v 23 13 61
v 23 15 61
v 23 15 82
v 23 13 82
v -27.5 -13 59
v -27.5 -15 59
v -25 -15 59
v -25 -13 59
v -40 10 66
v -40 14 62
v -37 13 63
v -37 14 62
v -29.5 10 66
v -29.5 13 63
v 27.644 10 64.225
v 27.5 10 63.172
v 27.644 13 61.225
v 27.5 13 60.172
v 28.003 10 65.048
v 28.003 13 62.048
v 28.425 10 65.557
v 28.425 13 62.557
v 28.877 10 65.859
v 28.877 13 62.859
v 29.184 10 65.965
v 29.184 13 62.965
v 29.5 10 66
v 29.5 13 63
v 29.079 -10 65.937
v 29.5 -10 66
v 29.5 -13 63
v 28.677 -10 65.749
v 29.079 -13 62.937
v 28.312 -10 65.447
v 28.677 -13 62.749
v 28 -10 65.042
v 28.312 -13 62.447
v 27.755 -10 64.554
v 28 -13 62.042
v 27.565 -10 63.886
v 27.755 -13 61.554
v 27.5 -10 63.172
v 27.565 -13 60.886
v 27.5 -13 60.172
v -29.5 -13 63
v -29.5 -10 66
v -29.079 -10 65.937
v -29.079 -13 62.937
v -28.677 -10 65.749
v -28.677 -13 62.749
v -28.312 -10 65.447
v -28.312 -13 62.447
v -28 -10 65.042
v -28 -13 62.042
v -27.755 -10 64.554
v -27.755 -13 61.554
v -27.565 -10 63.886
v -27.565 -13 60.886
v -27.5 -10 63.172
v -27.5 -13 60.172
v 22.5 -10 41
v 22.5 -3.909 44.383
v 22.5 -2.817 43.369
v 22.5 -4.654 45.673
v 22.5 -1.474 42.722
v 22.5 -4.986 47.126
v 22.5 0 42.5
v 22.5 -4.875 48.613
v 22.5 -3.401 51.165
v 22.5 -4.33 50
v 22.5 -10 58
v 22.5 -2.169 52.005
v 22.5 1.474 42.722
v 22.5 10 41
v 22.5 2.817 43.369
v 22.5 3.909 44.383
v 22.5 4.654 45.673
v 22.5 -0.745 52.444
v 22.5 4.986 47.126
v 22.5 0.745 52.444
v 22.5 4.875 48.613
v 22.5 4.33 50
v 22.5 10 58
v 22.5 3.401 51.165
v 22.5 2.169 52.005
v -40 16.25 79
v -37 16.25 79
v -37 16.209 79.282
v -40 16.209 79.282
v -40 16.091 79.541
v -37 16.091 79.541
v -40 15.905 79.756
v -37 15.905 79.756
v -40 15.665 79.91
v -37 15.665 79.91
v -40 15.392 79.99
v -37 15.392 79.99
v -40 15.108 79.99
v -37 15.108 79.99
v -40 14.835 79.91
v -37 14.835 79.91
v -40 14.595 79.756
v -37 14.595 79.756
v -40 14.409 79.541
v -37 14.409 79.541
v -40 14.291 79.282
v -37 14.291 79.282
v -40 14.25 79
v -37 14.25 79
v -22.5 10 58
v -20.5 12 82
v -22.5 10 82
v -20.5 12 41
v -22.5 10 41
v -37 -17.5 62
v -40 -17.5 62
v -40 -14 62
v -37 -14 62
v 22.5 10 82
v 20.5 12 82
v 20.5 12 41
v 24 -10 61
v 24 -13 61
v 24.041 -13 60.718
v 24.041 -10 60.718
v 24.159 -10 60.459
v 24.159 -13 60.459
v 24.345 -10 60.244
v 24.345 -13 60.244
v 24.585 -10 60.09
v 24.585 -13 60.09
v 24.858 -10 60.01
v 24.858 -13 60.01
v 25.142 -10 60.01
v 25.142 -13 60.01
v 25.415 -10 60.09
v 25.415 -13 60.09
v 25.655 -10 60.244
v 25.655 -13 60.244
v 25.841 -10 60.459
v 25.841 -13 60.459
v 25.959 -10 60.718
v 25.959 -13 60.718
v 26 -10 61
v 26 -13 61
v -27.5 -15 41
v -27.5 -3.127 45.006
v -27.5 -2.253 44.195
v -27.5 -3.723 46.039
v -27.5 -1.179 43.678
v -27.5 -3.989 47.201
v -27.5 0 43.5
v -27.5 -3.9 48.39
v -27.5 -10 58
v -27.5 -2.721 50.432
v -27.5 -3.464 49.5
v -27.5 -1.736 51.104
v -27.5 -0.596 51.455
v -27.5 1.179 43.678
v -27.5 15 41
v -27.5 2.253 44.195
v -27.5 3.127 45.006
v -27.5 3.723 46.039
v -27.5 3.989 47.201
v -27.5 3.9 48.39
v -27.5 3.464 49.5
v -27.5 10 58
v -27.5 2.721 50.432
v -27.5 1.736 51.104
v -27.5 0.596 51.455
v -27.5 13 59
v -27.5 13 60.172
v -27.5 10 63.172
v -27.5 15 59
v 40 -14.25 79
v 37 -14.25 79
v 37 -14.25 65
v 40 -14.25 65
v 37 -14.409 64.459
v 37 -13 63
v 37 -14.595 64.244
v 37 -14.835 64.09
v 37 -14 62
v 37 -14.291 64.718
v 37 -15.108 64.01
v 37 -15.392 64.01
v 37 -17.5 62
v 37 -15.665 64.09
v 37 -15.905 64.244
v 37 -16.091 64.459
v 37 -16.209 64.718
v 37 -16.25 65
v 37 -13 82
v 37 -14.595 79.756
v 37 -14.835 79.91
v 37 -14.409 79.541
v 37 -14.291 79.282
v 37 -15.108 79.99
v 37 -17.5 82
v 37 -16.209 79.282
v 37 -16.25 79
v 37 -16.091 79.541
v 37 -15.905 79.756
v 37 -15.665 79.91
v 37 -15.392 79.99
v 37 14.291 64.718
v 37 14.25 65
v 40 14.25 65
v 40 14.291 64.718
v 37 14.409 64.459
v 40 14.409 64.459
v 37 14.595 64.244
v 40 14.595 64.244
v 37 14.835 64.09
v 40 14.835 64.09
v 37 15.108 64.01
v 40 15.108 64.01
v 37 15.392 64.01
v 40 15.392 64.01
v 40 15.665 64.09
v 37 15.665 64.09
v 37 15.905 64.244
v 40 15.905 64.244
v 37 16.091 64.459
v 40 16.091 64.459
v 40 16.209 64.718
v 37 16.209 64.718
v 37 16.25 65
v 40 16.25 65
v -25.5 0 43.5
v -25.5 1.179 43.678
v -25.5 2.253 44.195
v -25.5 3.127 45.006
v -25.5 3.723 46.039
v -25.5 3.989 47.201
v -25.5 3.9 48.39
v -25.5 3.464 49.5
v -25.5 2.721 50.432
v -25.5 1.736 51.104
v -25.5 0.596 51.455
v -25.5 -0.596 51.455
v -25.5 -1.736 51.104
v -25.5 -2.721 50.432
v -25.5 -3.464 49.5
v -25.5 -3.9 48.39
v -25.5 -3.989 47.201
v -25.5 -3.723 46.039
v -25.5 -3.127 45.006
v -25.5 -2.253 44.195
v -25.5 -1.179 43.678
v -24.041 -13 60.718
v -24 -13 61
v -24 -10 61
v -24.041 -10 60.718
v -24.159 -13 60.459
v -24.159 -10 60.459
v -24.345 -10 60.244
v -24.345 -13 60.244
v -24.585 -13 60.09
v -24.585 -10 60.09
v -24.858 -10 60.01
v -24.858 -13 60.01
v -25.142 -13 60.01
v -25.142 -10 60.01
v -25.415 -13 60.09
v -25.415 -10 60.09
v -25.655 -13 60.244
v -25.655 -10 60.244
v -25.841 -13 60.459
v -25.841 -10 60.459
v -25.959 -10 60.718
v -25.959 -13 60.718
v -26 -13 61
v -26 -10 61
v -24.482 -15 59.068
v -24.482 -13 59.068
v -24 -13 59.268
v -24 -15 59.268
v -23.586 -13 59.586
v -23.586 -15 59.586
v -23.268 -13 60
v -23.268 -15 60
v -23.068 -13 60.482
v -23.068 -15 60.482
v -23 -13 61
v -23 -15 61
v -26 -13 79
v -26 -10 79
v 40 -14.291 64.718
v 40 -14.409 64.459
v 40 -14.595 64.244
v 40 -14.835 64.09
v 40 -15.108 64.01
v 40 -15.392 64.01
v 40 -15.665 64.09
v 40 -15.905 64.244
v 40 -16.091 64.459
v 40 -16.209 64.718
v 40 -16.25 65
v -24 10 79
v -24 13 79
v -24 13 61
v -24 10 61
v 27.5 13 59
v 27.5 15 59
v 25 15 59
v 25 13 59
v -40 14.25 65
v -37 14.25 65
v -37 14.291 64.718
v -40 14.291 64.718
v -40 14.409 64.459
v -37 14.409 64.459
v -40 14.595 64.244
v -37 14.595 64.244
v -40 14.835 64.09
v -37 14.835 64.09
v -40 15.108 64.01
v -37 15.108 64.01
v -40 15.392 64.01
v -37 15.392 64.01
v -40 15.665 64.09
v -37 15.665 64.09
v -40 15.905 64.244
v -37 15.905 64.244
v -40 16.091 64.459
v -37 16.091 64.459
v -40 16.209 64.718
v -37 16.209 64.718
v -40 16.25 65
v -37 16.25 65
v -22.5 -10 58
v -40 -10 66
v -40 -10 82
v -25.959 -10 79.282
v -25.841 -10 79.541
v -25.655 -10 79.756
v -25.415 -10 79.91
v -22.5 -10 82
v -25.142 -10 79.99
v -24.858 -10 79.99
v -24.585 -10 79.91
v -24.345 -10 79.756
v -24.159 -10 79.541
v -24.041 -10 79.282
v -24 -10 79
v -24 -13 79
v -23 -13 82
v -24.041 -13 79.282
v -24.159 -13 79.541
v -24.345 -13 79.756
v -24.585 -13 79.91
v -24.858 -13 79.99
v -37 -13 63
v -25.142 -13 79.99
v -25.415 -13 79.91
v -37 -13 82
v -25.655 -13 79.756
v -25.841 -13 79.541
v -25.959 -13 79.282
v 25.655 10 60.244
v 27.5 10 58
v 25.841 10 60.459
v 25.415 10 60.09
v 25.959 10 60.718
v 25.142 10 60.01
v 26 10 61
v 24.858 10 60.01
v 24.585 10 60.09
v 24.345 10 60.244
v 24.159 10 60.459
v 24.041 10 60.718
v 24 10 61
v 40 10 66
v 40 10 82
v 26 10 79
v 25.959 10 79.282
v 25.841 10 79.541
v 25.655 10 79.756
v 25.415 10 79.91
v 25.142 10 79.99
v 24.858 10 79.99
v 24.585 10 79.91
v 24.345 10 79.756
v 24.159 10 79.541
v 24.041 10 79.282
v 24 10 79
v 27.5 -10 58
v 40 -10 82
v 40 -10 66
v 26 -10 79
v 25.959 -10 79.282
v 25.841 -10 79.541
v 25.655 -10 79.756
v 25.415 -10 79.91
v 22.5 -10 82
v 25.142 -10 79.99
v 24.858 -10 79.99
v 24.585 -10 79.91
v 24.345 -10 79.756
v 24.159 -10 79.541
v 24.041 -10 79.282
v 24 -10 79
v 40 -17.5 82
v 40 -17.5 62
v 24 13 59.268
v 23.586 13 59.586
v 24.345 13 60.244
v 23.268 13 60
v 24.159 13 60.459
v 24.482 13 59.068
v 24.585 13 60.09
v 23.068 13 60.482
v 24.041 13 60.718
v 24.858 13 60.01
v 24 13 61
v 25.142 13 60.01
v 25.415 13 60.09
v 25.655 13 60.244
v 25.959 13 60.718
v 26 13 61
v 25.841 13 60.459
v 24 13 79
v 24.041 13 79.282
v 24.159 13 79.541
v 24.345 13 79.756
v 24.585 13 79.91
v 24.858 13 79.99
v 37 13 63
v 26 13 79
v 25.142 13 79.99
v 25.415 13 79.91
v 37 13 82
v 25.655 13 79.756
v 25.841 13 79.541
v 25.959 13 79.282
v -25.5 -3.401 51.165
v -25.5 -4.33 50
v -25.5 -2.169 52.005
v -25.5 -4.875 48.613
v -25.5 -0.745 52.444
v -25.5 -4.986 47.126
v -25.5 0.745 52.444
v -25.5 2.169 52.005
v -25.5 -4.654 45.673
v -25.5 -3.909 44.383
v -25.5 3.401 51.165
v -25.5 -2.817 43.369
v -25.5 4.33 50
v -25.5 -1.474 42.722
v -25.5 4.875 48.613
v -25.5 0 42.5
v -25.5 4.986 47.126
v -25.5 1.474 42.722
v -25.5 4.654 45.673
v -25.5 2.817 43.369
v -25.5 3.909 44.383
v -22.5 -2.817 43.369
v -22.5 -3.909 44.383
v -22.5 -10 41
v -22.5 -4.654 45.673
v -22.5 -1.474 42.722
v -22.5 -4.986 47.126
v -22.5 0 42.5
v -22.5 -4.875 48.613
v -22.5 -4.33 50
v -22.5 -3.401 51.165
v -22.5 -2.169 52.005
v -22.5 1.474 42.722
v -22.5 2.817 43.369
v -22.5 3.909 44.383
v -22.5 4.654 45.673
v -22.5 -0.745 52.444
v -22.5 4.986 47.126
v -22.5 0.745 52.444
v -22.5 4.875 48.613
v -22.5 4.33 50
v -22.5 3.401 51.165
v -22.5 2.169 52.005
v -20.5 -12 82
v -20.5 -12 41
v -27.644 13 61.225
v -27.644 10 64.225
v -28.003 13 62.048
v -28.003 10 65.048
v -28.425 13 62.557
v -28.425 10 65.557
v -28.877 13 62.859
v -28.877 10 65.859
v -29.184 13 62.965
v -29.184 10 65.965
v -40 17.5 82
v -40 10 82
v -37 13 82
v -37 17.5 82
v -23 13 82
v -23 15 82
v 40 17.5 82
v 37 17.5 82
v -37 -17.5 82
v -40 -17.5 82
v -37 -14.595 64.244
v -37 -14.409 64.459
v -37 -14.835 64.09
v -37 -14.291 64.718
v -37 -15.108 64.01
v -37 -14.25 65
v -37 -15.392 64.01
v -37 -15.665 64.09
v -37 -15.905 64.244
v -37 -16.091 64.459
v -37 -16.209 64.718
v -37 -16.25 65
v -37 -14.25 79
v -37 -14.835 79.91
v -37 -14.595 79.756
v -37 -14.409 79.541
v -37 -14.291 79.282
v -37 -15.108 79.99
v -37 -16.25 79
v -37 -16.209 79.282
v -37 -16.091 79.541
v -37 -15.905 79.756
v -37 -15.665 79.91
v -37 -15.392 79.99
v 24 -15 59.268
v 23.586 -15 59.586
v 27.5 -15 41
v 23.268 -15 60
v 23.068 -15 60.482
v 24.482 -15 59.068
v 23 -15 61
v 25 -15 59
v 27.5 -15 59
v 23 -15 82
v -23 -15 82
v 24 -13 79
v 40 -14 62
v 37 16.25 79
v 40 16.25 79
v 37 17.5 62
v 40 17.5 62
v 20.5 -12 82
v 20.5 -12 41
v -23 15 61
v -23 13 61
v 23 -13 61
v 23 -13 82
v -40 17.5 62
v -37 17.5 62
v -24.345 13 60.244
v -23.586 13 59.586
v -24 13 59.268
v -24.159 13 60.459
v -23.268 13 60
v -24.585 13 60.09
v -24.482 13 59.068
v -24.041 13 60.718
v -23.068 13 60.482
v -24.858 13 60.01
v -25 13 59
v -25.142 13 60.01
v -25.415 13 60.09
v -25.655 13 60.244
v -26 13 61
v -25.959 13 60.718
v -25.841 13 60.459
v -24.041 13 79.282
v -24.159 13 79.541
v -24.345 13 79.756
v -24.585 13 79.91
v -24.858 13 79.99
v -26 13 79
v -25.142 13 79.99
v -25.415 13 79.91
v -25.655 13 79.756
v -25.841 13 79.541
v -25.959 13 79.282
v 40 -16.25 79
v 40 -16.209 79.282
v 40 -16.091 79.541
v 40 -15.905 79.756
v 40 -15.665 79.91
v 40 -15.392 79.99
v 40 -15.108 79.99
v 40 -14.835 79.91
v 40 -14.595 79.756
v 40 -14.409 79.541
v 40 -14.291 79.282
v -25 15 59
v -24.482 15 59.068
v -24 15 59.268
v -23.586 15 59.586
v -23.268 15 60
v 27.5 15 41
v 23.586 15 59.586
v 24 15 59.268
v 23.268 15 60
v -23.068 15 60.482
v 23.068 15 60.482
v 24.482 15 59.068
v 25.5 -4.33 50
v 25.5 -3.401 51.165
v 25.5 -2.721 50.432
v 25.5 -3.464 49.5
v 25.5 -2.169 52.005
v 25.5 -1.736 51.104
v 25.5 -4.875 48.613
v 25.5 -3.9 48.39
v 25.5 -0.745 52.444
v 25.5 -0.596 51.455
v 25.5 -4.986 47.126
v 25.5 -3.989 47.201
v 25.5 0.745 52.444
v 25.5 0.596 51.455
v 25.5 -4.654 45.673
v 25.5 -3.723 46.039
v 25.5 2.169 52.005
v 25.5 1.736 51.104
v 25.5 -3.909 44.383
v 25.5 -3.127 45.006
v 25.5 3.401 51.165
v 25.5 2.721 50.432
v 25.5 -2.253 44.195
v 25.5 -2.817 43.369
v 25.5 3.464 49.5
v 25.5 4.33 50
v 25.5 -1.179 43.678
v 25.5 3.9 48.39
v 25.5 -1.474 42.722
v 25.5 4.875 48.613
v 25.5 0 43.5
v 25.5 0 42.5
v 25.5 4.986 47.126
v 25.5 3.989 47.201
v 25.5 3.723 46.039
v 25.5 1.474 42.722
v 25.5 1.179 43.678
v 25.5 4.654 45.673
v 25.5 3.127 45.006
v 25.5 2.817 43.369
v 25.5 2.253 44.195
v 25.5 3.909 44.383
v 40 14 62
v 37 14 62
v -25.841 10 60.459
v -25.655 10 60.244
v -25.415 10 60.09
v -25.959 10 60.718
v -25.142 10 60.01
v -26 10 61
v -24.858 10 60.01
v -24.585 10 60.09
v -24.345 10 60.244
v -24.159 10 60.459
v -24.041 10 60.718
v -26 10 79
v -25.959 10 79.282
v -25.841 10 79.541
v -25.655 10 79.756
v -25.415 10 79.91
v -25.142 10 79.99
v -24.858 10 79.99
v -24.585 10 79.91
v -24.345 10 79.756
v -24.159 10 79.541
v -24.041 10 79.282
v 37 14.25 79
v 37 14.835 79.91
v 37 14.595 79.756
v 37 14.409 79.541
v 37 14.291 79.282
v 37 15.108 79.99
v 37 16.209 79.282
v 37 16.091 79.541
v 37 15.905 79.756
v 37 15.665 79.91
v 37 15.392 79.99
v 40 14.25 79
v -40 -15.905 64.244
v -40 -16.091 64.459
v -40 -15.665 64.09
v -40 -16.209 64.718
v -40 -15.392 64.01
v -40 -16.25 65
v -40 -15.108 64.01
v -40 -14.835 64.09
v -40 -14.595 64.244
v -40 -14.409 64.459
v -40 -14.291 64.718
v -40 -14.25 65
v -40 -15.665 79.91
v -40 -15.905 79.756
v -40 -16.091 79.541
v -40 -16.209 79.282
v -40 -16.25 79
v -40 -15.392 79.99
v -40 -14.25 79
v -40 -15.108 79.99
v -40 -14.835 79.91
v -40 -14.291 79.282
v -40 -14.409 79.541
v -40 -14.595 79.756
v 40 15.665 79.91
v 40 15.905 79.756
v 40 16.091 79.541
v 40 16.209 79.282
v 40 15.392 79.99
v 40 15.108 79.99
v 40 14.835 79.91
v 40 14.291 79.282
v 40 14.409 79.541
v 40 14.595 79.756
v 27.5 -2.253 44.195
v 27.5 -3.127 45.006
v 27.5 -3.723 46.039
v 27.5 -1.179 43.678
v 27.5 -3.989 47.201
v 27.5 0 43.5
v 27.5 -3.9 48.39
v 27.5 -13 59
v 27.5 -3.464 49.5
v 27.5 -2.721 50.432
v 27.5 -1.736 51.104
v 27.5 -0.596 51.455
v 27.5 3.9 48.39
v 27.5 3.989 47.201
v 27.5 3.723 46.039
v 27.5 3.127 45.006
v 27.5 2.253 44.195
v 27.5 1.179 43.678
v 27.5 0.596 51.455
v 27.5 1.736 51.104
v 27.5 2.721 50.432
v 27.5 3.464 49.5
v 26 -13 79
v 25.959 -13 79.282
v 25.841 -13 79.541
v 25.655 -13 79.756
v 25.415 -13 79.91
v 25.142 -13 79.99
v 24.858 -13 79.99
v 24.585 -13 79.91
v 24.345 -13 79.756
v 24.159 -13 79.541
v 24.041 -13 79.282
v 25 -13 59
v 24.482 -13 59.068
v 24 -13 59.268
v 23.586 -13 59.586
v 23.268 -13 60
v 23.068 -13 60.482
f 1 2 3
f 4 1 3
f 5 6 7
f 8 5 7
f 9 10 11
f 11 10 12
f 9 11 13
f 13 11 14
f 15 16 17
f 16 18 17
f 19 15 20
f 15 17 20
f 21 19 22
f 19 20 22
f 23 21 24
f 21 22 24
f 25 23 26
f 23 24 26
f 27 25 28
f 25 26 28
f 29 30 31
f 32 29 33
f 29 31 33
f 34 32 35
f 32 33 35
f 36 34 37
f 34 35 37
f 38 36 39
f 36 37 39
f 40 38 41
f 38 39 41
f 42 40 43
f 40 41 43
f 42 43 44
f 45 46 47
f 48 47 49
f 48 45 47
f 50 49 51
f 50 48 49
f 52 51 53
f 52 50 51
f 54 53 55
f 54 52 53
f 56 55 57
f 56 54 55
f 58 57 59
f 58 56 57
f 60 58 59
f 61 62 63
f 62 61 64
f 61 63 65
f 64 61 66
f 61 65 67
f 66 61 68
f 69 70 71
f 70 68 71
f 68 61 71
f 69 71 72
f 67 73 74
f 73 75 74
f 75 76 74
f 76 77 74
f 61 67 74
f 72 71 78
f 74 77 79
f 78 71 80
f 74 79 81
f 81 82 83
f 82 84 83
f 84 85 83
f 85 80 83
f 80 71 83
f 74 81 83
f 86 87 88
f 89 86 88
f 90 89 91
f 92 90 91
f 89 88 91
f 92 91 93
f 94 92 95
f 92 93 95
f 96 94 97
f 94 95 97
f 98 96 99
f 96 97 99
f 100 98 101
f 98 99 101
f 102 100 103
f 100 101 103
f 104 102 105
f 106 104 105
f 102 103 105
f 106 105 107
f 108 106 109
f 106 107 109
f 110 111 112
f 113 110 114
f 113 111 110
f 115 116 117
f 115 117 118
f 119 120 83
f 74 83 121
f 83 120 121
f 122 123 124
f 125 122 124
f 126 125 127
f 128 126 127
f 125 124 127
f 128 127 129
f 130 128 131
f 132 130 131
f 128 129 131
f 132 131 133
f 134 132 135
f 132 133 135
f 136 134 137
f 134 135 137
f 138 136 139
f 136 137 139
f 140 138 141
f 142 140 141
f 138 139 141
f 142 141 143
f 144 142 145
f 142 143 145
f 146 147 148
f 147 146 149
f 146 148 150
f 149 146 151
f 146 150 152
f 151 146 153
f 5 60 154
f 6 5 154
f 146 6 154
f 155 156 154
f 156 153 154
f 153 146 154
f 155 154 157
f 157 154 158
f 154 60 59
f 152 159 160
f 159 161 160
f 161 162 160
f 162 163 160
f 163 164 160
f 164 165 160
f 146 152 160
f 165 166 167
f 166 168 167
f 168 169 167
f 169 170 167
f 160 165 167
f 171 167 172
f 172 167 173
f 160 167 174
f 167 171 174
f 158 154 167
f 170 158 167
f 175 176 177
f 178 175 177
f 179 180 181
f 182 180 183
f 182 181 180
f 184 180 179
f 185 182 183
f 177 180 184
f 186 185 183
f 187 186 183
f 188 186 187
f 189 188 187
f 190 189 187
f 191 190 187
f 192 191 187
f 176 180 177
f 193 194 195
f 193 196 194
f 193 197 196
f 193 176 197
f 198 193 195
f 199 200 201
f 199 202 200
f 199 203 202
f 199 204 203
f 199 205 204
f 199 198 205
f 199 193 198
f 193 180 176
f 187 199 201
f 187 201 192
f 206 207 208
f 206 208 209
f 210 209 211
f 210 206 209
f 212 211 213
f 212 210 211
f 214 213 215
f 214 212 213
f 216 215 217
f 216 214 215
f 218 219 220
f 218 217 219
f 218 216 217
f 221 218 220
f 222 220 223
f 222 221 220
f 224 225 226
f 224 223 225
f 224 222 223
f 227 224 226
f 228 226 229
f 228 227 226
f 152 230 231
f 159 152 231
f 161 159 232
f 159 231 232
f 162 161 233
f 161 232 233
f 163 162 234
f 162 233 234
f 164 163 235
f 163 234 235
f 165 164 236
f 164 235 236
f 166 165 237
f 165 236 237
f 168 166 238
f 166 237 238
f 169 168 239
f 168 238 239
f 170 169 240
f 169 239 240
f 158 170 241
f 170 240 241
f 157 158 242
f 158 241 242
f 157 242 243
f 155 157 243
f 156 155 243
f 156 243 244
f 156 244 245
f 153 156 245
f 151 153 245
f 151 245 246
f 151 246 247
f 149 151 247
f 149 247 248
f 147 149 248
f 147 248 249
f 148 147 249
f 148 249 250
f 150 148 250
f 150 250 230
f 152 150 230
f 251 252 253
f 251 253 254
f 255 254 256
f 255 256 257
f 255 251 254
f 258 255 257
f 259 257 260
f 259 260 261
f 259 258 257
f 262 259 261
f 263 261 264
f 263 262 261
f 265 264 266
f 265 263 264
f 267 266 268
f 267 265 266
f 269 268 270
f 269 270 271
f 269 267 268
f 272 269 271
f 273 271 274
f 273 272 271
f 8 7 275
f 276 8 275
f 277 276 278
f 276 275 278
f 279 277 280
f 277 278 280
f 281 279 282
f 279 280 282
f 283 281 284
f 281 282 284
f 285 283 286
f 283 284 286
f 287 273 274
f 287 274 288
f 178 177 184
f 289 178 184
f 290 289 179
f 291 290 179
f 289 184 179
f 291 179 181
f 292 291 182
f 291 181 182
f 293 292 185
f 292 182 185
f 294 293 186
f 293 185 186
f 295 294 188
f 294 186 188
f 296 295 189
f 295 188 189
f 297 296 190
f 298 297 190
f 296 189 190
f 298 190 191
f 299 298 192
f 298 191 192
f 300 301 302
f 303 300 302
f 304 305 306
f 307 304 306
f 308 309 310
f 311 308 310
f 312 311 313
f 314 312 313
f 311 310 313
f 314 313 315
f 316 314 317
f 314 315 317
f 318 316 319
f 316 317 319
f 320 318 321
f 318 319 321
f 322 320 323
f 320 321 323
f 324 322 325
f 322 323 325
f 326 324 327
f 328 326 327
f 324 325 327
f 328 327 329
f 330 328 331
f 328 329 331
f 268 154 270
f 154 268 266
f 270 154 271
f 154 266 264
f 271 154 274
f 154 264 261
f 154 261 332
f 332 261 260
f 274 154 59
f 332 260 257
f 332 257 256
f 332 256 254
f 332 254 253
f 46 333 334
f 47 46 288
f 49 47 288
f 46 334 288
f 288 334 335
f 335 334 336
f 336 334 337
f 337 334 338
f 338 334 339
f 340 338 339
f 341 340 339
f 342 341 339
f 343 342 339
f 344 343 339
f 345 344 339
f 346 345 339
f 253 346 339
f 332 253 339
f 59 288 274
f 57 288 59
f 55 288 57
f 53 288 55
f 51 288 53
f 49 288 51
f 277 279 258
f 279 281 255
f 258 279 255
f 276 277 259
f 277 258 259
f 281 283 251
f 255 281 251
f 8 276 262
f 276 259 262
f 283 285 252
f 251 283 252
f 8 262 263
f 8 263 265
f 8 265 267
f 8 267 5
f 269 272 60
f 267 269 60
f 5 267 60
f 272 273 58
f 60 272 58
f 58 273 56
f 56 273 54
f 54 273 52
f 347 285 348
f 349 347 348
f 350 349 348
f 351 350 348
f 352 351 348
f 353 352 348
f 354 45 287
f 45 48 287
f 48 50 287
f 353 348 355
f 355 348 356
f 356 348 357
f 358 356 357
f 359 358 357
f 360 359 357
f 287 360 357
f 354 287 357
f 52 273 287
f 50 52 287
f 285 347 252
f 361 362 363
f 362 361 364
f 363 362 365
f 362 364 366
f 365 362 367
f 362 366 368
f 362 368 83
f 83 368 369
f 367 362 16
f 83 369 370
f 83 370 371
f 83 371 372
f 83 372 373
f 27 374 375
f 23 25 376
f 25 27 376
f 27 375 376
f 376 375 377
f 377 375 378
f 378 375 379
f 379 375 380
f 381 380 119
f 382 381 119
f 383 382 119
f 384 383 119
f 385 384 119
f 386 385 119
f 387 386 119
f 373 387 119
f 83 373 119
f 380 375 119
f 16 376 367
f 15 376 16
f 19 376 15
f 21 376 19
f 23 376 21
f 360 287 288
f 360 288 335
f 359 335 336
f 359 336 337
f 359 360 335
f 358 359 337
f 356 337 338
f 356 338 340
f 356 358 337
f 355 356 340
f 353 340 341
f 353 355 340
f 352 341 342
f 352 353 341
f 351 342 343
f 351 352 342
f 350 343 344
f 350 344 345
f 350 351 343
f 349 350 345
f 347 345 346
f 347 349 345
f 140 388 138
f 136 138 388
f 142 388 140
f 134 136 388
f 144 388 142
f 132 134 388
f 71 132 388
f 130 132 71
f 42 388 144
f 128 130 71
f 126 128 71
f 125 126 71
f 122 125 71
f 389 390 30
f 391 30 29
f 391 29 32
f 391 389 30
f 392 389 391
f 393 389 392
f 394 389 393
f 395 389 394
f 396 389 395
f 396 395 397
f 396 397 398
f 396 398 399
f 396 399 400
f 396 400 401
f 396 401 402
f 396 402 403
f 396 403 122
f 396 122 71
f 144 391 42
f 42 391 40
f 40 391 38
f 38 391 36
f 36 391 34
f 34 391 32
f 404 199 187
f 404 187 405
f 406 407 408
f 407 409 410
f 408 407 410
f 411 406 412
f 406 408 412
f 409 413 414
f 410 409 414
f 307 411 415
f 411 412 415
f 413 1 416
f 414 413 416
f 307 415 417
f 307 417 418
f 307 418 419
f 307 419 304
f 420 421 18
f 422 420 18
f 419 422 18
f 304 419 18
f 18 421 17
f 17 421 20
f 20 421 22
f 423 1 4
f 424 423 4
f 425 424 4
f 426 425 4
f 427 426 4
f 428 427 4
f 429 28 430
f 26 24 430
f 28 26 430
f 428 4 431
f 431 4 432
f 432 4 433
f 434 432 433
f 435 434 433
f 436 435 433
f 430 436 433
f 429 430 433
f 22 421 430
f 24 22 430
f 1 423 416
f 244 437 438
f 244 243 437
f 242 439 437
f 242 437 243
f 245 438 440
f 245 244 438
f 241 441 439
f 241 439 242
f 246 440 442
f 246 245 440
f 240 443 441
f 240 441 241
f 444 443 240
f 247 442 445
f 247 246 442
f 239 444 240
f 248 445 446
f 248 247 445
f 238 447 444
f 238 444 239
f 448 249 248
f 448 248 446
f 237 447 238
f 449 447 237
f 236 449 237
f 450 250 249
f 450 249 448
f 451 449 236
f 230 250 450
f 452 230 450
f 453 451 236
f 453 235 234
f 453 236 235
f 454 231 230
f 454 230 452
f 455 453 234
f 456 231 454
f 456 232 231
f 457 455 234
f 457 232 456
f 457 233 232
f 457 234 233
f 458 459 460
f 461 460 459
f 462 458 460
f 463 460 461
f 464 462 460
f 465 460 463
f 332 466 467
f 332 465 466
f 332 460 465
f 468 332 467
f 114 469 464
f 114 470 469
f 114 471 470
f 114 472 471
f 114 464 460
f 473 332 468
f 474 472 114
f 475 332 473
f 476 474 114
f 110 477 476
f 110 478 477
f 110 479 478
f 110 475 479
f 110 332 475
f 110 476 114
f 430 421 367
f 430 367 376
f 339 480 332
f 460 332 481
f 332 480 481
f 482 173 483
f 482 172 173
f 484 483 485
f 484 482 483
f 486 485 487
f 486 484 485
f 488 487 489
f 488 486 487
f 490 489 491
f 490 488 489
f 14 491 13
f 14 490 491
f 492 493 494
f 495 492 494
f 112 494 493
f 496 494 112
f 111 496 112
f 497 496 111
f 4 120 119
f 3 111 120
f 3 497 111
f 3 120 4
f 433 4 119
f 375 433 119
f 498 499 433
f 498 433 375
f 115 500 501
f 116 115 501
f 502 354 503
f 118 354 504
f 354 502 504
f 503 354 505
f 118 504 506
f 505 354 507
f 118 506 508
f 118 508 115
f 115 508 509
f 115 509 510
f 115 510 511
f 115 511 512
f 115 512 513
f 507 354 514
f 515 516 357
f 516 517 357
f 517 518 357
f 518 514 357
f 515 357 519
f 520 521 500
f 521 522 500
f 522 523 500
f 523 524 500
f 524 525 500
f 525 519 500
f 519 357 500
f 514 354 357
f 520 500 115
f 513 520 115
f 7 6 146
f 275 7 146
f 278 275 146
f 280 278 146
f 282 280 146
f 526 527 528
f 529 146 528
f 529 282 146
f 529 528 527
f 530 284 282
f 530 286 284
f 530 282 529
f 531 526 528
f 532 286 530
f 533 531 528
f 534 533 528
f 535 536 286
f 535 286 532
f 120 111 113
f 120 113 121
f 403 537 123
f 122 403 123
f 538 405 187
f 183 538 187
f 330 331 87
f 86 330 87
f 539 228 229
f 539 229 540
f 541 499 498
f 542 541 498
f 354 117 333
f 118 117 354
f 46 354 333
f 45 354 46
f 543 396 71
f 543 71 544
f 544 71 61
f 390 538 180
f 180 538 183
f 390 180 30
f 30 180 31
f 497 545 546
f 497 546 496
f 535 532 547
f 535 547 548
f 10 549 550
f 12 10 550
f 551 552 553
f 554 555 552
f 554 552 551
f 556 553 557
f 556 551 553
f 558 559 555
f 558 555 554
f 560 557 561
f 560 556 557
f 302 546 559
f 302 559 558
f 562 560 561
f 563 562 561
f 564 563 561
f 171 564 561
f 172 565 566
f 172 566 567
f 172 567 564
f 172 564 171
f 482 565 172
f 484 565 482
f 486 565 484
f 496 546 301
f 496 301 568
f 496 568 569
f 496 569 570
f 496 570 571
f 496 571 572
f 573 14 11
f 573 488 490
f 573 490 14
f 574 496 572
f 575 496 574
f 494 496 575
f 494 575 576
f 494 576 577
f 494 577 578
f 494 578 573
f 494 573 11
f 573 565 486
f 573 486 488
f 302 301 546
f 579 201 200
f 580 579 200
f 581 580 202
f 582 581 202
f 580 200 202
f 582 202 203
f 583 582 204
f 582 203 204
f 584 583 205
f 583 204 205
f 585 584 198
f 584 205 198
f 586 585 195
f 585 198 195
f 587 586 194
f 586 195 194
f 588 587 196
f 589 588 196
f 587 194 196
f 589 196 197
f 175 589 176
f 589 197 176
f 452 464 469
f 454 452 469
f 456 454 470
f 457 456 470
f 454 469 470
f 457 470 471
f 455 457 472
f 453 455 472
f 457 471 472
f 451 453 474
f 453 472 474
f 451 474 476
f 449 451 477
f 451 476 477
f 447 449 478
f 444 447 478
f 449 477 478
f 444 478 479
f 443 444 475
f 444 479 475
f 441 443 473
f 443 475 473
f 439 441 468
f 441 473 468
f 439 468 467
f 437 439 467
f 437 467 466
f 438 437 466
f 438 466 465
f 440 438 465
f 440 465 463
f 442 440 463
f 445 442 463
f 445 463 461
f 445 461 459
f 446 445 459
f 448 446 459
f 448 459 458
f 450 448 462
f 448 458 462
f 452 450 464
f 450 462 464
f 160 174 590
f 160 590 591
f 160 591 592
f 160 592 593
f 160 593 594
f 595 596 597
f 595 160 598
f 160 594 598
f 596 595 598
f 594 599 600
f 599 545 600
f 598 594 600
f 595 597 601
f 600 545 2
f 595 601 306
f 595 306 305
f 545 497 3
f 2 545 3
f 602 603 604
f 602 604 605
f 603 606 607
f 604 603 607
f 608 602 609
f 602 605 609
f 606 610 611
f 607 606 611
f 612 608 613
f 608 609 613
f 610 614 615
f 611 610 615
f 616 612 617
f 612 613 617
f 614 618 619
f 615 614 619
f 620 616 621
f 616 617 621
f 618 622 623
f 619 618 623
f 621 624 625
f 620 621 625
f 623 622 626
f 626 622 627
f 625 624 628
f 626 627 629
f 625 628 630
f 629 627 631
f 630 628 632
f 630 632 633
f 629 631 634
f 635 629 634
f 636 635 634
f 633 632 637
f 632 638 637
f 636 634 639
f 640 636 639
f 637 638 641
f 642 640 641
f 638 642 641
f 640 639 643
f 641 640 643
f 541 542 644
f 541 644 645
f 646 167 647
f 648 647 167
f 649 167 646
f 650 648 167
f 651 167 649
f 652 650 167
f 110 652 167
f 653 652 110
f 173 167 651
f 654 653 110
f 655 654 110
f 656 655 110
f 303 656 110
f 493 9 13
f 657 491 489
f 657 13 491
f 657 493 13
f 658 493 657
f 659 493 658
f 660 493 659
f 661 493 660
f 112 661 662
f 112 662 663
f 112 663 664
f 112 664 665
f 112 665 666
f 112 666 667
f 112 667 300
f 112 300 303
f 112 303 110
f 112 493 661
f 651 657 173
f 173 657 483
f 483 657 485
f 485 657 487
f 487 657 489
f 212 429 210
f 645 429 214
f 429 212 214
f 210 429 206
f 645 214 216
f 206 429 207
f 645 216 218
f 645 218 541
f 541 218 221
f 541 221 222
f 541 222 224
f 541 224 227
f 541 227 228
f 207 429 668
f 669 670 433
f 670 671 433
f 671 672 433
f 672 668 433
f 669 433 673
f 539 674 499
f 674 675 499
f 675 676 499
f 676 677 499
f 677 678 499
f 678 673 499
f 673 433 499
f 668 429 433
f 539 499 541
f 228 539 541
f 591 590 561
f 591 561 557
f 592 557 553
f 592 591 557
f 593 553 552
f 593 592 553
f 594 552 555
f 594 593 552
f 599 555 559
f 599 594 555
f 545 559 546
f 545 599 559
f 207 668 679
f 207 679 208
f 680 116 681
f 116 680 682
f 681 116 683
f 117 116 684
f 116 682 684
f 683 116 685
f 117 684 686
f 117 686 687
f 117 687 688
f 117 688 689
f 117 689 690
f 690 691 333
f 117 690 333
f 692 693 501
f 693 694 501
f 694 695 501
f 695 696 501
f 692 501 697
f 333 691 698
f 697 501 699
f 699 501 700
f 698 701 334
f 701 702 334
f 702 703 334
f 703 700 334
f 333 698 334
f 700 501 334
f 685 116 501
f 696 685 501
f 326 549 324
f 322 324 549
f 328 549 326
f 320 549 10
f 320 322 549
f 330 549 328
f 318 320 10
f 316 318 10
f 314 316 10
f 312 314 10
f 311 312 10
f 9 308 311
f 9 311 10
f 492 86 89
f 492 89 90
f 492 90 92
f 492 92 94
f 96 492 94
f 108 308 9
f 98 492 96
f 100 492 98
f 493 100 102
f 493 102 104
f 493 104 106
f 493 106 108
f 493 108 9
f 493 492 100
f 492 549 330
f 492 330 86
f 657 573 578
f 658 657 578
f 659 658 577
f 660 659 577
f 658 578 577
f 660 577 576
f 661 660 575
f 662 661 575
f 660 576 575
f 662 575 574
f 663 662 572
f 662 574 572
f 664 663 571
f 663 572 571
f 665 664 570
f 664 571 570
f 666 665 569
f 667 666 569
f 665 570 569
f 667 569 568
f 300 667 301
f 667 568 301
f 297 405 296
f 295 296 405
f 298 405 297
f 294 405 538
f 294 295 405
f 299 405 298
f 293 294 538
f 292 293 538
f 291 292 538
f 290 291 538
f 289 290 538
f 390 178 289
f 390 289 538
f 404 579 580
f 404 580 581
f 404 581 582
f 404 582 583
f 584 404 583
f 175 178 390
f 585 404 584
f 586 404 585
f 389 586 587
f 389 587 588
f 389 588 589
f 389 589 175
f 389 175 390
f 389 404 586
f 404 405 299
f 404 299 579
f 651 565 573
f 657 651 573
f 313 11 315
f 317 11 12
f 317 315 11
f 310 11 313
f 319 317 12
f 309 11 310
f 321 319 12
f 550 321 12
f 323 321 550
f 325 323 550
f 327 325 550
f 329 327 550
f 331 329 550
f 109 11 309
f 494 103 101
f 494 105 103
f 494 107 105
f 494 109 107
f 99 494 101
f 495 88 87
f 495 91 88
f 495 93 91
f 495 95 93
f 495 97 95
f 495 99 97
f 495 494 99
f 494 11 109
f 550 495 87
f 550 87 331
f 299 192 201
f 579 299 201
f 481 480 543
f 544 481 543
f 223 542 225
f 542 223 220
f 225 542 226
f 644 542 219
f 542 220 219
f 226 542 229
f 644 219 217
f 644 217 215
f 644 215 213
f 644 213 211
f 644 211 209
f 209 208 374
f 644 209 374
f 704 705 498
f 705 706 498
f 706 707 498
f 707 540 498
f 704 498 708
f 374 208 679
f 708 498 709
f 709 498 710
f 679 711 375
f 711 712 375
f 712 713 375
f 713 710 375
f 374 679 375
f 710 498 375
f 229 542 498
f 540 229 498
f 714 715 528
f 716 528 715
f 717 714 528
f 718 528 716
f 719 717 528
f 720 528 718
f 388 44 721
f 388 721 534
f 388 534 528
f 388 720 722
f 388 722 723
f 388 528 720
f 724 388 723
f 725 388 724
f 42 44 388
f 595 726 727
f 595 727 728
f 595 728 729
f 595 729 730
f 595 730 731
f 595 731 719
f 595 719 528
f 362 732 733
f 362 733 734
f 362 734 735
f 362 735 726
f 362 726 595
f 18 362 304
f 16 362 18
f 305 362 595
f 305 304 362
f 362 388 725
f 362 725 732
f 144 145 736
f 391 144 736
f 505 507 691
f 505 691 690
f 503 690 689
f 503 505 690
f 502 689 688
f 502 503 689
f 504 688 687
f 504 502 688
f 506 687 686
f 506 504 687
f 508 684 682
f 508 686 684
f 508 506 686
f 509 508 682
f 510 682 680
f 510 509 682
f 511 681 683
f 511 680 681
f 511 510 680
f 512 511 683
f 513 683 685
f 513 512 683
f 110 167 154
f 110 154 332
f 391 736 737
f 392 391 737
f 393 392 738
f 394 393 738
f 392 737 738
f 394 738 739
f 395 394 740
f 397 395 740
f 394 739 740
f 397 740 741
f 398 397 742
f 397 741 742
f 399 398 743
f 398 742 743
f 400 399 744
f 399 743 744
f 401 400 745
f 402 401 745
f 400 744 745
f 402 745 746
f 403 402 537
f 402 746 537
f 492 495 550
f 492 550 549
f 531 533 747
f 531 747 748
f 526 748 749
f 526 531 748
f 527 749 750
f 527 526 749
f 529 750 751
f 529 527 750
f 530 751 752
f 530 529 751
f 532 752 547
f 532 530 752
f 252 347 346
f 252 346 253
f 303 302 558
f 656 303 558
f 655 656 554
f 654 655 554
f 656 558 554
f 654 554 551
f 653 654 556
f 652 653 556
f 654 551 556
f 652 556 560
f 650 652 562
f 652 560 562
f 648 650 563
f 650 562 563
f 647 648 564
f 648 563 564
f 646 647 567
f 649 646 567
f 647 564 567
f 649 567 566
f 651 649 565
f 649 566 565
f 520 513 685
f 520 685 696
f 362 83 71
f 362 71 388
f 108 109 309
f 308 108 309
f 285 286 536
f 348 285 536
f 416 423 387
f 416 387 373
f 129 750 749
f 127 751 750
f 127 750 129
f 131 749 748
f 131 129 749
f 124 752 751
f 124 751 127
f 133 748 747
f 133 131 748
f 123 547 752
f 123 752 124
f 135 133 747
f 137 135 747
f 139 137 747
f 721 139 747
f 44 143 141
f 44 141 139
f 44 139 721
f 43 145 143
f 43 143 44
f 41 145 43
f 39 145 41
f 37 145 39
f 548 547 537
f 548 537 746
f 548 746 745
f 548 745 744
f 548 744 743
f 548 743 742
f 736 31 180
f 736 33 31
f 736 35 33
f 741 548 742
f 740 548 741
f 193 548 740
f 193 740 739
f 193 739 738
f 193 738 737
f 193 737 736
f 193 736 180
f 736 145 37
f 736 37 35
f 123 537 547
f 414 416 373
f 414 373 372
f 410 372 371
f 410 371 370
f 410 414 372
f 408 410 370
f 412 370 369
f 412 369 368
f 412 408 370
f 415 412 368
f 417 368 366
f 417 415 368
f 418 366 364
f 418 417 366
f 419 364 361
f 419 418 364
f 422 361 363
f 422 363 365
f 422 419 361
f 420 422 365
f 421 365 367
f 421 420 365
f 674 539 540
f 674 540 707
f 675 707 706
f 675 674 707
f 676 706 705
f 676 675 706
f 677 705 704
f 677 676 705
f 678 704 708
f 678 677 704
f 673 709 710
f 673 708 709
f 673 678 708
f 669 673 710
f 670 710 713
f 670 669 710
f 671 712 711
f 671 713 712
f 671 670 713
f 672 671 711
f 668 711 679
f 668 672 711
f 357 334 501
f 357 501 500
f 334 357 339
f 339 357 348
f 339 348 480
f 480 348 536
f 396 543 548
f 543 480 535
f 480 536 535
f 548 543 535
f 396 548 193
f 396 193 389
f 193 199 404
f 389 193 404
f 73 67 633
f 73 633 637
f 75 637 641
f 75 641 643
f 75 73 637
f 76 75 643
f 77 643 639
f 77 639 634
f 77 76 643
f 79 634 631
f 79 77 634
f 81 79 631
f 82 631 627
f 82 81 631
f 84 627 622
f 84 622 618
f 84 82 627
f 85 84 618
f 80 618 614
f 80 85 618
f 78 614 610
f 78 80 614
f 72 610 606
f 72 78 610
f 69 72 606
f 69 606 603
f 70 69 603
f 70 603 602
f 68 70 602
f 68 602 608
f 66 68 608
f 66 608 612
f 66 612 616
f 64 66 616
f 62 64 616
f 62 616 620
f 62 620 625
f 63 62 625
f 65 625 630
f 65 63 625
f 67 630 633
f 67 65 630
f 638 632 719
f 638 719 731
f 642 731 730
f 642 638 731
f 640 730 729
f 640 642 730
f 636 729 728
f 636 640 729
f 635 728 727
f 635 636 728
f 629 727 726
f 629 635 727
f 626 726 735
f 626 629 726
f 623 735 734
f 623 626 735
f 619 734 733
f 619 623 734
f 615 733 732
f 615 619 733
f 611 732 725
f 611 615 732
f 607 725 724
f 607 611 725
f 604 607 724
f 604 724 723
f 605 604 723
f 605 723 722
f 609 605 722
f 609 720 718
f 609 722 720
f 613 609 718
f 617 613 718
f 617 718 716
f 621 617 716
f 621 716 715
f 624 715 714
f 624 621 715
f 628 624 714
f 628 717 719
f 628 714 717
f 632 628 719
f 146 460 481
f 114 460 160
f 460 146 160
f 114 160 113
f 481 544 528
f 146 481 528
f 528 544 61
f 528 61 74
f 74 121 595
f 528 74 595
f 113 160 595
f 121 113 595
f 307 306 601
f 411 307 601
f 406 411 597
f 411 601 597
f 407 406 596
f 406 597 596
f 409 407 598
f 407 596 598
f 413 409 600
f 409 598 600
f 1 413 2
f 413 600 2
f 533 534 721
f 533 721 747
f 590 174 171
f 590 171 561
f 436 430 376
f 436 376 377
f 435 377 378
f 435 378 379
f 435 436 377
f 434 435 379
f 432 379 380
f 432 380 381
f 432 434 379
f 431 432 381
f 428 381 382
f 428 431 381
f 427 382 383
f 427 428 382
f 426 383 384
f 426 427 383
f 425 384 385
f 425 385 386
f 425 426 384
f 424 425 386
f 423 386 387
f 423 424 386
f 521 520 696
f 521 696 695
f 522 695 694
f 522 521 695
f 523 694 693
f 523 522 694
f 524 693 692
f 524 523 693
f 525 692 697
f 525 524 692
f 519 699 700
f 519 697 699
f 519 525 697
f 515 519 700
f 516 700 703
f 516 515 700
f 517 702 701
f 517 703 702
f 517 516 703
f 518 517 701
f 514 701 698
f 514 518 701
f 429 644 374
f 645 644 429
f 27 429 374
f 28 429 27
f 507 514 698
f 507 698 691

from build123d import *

# Parameters (mm, degrees)
SKIZZE2_W                       = 55
SKIZZE2_H                       = 30
SKIZZE2_W_2                     = 45
SKIZZE2_H_2                     = 24
AUFSATZ_LINEAR_AUSTRAGEN1_DEPTH = 41
SKIZZE5_W                       = 55
SKIZZE5_H                       = 20
SCHNITT_LINEAR_AUSTRAGEN3_DEPTH = 24
SKIZZE4_R                       = 4
SCHNITT_LINEAR_AUSTRAGEN1_DEPTH = 51
SKIZZE4_3_R                     = 5
SCHNITT_LINEAR_AUSTRAGEN2_DEPTH = 3
SCHNITT_LINEAR_AUSTRAGEN4_DEPTH = 5
SCHNITT_LINEAR_AUSTRAGEN5_DEPTH = 2
AUFSATZ_LINEAR_AUSTRAGEN2_DEPTH = 20
SCHNITT_LINEAR_AUSTRAGEN6_DEPTH = 4
SPIEGELN1_COPY_1_DEPTH          = 5
SPIEGELN1_COPY_2_DEPTH          = 2
SPIEGELN1_COPY_3_DEPTH          = 20
SPIEGELN1_COPY_4_DEPTH          = 4
FASE2_SIZE                      = 2
FASE3_SIZE                      = 4
VERRUNDUNG1_R                   = 2


with BuildPart() as part:
    # Skizze2 → Aufsatz-Linear austragen1 (new body)
    with BuildSketch(Plane.XY.offset(82)):
        Rectangle(SKIZZE2_W, SKIZZE2_H)
        Rectangle(SKIZZE2_W_2, SKIZZE2_H_2, mode=Mode.SUBTRACT)
    extrude(amount=-AUFSATZ_LINEAR_AUSTRAGEN1_DEPTH)

    # Skizze5 → Schnitt-Linear austragen3 (cut)
    with BuildSketch(Plane.XY.offset(82)):
        Rectangle(SKIZZE5_W, SKIZZE5_H)
    extrude(amount=-SCHNITT_LINEAR_AUSTRAGEN3_DEPTH, mode=Mode.SUBTRACT)

    # Skizze4 → Schnitt-Linear austragen1 (cut, through all)
    with BuildSketch(Plane(origin=(22.5, 0, 0), x_dir=(0, 0, -1), z_dir=(1, 0, 0))):
        with Locations((-47.5, 0)):
            Circle(SKIZZE4_R)
    schnitt_linear_austragen1 = extrude(amount=-SCHNITT_LINEAR_AUSTRAGEN1_DEPTH, mode=Mode.SUBTRACT)

    # Skizze4<3> → Schnitt-Linear austragen2 (cut)
    with BuildSketch(Plane(origin=(22.5, 0, 0), x_dir=(0, 0, -1), z_dir=(1, 0, 0))):
        with Locations((-47.5, 0)):
            Circle(SKIZZE4_3_R)
    schnitt_linear_austragen2 = extrude(amount=SCHNITT_LINEAR_AUSTRAGEN2_DEPTH, mode=Mode.SUBTRACT)

    # Skizze6 → Schnitt-Linear austragen4 (cut)
    with BuildSketch(Plane(origin=(0, 15, 0), x_dir=(1, 0, 0), z_dir=(0, 1, 0))):
        with BuildLine():
            Line((26, -61), (26, -79))
            ThreePointArc((26, -79), (25, -80), (24, -79))
            Line((24, -79), (24, -61))
            ThreePointArc((24, -61), (25, -60), (26, -61))
        make_face()
    schnitt_linear_austragen4 = extrude(amount=-SCHNITT_LINEAR_AUSTRAGEN4_DEPTH, mode=Mode.SUBTRACT)

    # Skizze6<3> → Schnitt-Linear austragen5 (cut)
    with BuildSketch(Plane(origin=(0, 15, 0), x_dir=(1, 0, 0), z_dir=(0, 1, 0))):
        with BuildLine():
            Line((23, -61), (23, -79))
            ThreePointArc((23, -79), (25, -81), (27, -79))
            Line((27, -79), (27, -61))
            ThreePointArc((27, -61), (25, -59), (23, -61))
        make_face()
        with BuildLine():
            ThreePointArc((24, -79), (25, -80), (26, -79))
            Line((26, -79), (26, -61))
            ThreePointArc((26, -61), (25, -60), (24, -61))
            Line((24, -61), (24, -79))
        make_face(mode=Mode.SUBTRACT)
        with BuildLine():
            ThreePointArc((25, -59), (26.414213562, -59.585786438), (27, -61))
            Line((27, -61), (27, -79))
            ThreePointArc((27, -79), (25, -81), (23, -79))
            Line((23, -79), (23, -82))
            Line((23, -82), (27.5, -82))
            Line((27.5, -82), (27.5, -59))
            Line((27.5, -59), (25, -59))
        make_face()
    schnitt_linear_austragen5 = extrude(amount=-SCHNITT_LINEAR_AUSTRAGEN5_DEPTH, mode=Mode.SUBTRACT)

    # Skizze8 → Aufsatz-Linear austragen2 (add)
    with BuildSketch(Plane.XY.offset(82)):
        Polygon((27.5, 13), (37, 13), (37, 17.5), (40, 17.5), (40, 10), (27.5, 10), align=None)
    aufsatz_linear_austragen2 = extrude(amount=-AUFSATZ_LINEAR_AUSTRAGEN2_DEPTH)

    # Skizze9 → Schnitt-Linear austragen6 (cut, through all)
    with BuildSketch(Plane.ZY.offset(-37)):
        with BuildLine():
            Line((65, 16.25), (79, 16.25))
            ThreePointArc((79, 16.25), (80, 15.25), (79, 14.25))
            Line((79, 14.25), (65, 14.25))
            ThreePointArc((65, 14.25), (64, 15.25), (65, 16.25))
        make_face()
    schnitt_linear_austragen6 = extrude(amount=-SCHNITT_LINEAR_AUSTRAGEN6_DEPTH, mode=Mode.SUBTRACT)

    # Spiegeln2: Schnitt-Linear austragen4, Schnitt-Linear austragen5, Aufsatz-Linear austragen2, Schnitt-Linear austragen6 across plane
    add(schnitt_linear_austragen4.mirror(Plane.ZX), mode=Mode.SUBTRACT)
    add(schnitt_linear_austragen5.mirror(Plane.ZX), mode=Mode.SUBTRACT)
    add(aufsatz_linear_austragen2.mirror(Plane.ZX))
    add(schnitt_linear_austragen6.mirror(Plane.ZX), mode=Mode.SUBTRACT)

    # Spiegeln1: Schnitt-Linear austragen2, Schnitt-Linear austragen1, Schnitt-Linear austragen4, Schnitt-Linear austragen5, Aufsatz-Linear austragen2, Schnitt-Linear austragen6 across plane
    add(schnitt_linear_austragen2.mirror(Plane(origin=(0, 0, 0), x_dir=(0, 0, 1), z_dir=(1, 0, 0))), mode=Mode.SUBTRACT)
    add(schnitt_linear_austragen1.mirror(Plane(origin=(0, 0, 0), x_dir=(0, 0, 1), z_dir=(1, 0, 0))), mode=Mode.SUBTRACT)
    add(schnitt_linear_austragen4.mirror(Plane(origin=(0, 0, 0), x_dir=(0, 0, 1), z_dir=(1, 0, 0))), mode=Mode.SUBTRACT)
    add(schnitt_linear_austragen5.mirror(Plane(origin=(0, 0, 0), x_dir=(0, 0, 1), z_dir=(1, 0, 0))), mode=Mode.SUBTRACT)
    add(aufsatz_linear_austragen2.mirror(Plane(origin=(0, 0, 0), x_dir=(0, 0, 1), z_dir=(1, 0, 0))))
    add(schnitt_linear_austragen6.mirror(Plane(origin=(0, 0, 0), x_dir=(0, 0, 1), z_dir=(1, 0, 0))), mode=Mode.SUBTRACT)

    # Spiegeln1 copy 1 sketch → Spiegeln1 copy 1 (cut)
    with BuildSketch(Plane(origin=(0, -15, 0), x_dir=(-1, 0, 0), z_dir=(0, -1, 0))):
        with BuildLine():
            Line((26, -61), (26, -79))
            ThreePointArc((26, -79), (25, -80), (24, -79))
            Line((24, -79), (24, -61))
            ThreePointArc((24, -61), (25, -60), (26, -61))
        make_face()
    extrude(amount=-SPIEGELN1_COPY_1_DEPTH, mode=Mode.SUBTRACT)

    # Spiegeln1 copy 2 sketch → Spiegeln1 copy 2 (cut)
    with BuildSketch(Plane(origin=(0, -15, 0), x_dir=(-1, 0, 0), z_dir=(0, -1, 0))):
        with BuildLine():
            Line((23, -61), (23, -79))
            ThreePointArc((23, -79), (25, -81), (27, -79))
            Line((27, -79), (27, -61))
            ThreePointArc((27, -61), (25, -59), (23, -61))
        make_face()
        with BuildLine():
            ThreePointArc((24, -79), (25, -80), (26, -79))
            Line((26, -79), (26, -61))
            ThreePointArc((26, -61), (25, -60), (24, -61))
            Line((24, -61), (24, -79))
        make_face(mode=Mode.SUBTRACT)
        with BuildLine():
            ThreePointArc((25, -59), (26.414213562, -59.585786438), (27, -61))
            Line((27, -61), (27, -79))
            ThreePointArc((27, -79), (25, -81), (23, -79))
            Line((23, -79), (23, -82))
            Line((23, -82), (27.5, -82))
            Line((27.5, -82), (27.5, -59))
            Line((27.5, -59), (25, -59))
        make_face()
    extrude(amount=-SPIEGELN1_COPY_2_DEPTH, mode=Mode.SUBTRACT)

    # Spiegeln1 copy 3 sketch → Spiegeln1 copy 3 (add)
    with BuildSketch(Plane(origin=(0, 0, 82), x_dir=(-1, 0, 0), z_dir=(0, 0, 1))):
        Polygon((27.5, 13), (37, 13), (37, 17.5), (40, 17.5), (40, 10), (27.5, 10), align=None)
    extrude(amount=-SPIEGELN1_COPY_3_DEPTH)

    # Spiegeln1 copy 4 sketch → Spiegeln1 copy 4 (cut, through all)
    with BuildSketch(Plane(origin=(-37, 0, 0), x_dir=(0, 0, 1), z_dir=(1, 0, 0))):
        with BuildLine():
            Line((65, 16.25), (79, 16.25))
            ThreePointArc((79, 16.25), (80, 15.25), (79, 14.25))
            Line((79, 14.25), (65, 14.25))
            ThreePointArc((65, 14.25), (64, 15.25), (65, 16.25))
        make_face()
    extrude(amount=-SPIEGELN1_COPY_4_DEPTH, mode=Mode.SUBTRACT)

    # Fase2
    fase2_edges = [part.edges().sort_by_distance(p)[0] for p in [
        (-22.5, 12, 61.5),
        (-22.5, -12, 61.5),
        (22.5, -12, 61.5),
        (22.5, 12, 61.5),
    ]]
    chamfer(fase2_edges, length=FASE2_SIZE)

    # Fase3
    fase3_edges = [part.edges().sort_by_distance(p)[0] for p in [
        (-33.75, 10, 62),
        (-33.75, -10, 62),
        (33.75, -10, 62),
        (33.75, 10, 62),
    ]]
    chamfer(fase3_edges, length=FASE3_SIZE)

    # Verrundung1
    verrundung1_edges = [part.edges().sort_by_distance(p)[0] for p in [
        (-27.5, 11.5, 64.5),
        (-27.5, -11.5, 64.5),
        (27.5, -11.5, 64.5),
        (27.5, 11.5, 64.5),
    ]]
    fillet(verrundung1_edges, radius=VERRUNDUNG1_R)


solid = part.part
